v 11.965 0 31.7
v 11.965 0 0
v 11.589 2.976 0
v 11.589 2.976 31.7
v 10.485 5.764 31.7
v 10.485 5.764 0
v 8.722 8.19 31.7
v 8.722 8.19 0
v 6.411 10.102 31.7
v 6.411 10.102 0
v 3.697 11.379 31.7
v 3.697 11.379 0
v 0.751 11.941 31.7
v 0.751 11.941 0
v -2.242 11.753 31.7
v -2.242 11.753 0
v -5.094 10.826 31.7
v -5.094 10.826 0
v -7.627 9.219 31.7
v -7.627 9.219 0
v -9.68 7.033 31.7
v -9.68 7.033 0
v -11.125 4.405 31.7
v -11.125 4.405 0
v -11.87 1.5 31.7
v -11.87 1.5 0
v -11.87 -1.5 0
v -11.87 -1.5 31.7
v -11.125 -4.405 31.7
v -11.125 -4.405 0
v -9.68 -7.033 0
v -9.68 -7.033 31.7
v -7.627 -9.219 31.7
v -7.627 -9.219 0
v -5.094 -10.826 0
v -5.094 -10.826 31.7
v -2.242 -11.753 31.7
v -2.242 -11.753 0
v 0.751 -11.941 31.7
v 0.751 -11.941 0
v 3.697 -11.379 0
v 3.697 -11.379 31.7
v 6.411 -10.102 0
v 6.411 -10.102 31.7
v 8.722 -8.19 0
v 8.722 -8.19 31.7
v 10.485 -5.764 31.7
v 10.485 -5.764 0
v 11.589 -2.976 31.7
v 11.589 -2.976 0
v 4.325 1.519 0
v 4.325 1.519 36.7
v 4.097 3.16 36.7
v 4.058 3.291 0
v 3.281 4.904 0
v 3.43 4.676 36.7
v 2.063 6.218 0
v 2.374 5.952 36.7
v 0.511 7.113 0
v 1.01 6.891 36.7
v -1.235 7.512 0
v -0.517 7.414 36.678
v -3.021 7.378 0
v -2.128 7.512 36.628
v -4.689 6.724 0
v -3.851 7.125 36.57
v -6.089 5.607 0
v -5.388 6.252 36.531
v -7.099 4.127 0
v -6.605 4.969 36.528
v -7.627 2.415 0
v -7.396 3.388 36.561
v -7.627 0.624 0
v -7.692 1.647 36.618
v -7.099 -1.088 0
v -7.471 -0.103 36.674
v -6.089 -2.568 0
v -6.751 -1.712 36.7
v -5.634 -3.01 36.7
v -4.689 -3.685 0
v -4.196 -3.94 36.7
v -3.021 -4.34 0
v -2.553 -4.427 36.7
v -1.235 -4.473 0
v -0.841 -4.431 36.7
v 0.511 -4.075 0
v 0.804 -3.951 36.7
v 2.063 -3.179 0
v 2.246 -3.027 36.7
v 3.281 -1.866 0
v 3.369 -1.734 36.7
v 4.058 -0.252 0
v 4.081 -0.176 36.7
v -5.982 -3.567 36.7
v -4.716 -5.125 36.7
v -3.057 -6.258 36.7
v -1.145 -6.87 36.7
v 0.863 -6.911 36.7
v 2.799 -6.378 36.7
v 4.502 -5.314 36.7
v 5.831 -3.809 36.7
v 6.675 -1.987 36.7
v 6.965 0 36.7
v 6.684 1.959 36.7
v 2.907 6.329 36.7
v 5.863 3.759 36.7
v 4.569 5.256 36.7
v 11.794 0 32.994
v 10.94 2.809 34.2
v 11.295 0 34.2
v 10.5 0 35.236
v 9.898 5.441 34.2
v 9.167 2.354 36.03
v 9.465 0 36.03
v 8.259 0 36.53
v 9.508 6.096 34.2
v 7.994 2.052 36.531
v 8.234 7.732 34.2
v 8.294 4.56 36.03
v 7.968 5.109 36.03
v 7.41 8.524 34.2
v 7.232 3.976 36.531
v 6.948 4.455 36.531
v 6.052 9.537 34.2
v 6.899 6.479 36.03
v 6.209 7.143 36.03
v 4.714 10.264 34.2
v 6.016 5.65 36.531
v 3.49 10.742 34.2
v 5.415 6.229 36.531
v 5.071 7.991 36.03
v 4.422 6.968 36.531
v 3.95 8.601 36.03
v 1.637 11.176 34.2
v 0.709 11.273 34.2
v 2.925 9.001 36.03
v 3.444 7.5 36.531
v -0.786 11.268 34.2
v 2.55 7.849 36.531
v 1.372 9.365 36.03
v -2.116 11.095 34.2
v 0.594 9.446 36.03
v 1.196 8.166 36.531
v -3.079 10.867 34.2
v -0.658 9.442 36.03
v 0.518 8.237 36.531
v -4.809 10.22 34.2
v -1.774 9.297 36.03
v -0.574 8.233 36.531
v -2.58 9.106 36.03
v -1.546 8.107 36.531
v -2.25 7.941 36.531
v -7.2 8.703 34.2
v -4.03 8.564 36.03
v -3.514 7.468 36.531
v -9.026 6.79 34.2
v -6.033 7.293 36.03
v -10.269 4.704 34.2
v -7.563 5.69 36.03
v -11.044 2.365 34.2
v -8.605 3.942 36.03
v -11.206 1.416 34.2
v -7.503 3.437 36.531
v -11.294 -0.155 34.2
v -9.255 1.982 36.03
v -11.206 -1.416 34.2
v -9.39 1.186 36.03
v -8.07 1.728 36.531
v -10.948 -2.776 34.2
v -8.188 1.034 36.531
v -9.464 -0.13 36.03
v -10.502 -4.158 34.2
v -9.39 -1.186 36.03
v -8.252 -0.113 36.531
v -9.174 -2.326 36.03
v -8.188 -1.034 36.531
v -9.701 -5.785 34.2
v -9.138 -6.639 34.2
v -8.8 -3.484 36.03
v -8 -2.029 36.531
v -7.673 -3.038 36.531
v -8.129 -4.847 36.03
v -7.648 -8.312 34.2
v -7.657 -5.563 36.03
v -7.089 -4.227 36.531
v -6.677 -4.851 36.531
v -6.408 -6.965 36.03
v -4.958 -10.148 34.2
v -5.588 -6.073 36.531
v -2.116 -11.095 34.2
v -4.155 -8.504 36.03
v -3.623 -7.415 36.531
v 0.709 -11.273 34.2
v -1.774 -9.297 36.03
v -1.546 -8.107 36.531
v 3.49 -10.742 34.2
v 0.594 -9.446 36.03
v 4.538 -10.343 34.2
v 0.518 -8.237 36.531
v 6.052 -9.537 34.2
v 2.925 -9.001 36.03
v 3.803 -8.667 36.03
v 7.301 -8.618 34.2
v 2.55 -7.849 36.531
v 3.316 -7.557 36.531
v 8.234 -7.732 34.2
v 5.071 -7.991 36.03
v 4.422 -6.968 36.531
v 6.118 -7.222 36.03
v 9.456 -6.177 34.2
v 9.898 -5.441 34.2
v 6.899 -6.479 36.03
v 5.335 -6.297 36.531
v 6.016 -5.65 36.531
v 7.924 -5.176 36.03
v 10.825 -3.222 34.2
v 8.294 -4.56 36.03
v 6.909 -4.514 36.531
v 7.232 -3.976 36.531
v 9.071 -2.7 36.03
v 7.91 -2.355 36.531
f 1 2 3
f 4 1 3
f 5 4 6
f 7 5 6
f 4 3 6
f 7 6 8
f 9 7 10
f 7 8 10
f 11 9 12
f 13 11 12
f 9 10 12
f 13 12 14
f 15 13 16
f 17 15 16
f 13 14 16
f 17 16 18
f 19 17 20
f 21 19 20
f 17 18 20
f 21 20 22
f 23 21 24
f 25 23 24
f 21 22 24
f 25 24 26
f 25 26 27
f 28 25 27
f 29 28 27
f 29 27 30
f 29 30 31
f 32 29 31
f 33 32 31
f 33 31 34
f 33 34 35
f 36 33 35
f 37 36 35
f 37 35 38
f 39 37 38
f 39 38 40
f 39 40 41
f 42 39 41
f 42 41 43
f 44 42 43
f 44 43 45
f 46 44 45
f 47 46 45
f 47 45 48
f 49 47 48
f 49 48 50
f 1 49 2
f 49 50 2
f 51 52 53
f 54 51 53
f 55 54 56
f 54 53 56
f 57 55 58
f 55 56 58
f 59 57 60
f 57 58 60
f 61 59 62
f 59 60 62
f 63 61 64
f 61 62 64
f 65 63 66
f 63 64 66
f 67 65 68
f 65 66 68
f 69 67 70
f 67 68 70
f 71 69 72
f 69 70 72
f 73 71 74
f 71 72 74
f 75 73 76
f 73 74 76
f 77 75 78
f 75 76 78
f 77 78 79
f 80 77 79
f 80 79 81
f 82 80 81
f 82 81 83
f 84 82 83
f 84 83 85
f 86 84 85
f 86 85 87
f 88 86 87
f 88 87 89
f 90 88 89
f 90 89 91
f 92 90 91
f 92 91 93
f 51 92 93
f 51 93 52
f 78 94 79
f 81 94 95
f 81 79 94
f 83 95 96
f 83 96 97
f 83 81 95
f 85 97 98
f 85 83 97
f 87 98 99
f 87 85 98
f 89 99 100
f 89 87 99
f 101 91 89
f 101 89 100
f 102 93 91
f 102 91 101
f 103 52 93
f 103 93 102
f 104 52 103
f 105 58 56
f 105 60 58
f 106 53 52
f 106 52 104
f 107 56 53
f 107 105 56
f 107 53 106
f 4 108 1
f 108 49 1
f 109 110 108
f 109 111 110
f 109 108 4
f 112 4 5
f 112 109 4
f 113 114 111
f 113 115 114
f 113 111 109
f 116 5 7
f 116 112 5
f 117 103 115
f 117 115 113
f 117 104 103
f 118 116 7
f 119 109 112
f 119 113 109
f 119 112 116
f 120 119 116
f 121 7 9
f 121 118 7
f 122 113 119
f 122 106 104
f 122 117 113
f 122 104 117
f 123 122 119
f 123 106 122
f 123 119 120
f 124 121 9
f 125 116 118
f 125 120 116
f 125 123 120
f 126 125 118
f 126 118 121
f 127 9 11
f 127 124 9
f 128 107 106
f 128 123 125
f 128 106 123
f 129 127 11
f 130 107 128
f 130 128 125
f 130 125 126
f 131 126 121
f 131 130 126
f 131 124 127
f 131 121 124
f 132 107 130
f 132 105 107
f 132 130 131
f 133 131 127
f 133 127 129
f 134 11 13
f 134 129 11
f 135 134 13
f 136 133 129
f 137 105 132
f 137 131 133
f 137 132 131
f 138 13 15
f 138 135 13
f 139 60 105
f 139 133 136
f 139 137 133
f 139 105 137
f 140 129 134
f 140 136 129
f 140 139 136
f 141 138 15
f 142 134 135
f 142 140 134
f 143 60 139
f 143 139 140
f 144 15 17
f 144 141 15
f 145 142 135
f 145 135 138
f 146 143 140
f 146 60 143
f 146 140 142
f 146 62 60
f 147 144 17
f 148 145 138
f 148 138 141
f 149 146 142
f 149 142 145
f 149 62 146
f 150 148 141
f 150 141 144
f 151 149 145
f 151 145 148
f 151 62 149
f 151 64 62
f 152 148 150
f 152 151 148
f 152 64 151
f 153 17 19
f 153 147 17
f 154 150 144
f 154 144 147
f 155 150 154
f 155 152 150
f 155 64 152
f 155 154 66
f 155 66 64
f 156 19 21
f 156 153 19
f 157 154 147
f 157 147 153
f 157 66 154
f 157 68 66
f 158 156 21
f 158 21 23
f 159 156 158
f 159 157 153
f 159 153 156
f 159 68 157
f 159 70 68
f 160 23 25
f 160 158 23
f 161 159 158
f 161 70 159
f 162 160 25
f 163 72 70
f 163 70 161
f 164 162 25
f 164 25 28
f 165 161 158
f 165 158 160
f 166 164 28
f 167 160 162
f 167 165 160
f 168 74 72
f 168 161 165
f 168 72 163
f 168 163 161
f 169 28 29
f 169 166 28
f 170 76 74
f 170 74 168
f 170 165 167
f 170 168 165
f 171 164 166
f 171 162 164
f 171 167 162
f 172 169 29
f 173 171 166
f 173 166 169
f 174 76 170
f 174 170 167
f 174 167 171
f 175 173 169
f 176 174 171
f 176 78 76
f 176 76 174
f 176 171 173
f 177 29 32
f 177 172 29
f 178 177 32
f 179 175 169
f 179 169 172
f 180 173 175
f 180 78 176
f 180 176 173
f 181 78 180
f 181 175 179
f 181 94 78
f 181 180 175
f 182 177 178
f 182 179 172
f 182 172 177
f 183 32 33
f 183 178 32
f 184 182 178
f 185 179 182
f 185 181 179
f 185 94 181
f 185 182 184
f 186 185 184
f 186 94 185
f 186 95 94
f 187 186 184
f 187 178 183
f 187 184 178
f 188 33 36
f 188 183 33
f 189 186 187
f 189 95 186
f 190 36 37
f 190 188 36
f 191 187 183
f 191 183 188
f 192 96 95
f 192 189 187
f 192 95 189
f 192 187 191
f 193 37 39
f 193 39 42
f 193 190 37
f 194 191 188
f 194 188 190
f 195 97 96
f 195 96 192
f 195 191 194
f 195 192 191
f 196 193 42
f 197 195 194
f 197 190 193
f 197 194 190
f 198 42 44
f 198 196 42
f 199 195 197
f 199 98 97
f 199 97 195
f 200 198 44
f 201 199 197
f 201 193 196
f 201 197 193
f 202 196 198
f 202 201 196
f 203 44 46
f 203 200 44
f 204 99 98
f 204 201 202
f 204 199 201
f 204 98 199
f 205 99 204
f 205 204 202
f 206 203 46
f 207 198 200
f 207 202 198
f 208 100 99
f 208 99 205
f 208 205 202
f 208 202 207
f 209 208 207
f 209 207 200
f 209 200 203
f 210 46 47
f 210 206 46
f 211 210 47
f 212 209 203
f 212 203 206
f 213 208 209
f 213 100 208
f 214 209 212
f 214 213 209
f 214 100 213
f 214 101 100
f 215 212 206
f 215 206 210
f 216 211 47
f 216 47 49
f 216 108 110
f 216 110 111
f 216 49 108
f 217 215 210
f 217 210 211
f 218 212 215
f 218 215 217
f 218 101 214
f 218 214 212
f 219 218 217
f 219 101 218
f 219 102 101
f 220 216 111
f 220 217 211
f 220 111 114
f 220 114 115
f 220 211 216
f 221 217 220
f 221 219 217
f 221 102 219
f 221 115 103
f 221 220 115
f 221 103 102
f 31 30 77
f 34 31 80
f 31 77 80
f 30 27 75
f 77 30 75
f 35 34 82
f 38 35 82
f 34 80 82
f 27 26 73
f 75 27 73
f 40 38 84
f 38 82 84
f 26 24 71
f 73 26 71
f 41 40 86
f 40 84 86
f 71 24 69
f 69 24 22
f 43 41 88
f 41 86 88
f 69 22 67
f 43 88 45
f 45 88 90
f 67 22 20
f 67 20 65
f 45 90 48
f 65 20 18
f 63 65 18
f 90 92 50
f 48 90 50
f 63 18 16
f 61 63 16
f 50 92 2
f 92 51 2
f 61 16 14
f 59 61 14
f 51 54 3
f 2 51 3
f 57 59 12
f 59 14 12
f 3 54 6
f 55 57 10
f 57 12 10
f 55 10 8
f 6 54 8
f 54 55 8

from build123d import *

# Parameters (mm, degrees)
F0_R     = 11.9647327703
F1_DEPTH = 36.7
F2_R     = 6.0094743431
F3_DEPTH = 36.701


# Not quite as in the source:
# - a fillet or chamfer that OpenCascade refuses, or shapes differently, is made with other operations: its cross-section is extruded or revolved along the edge and cut away or added


with BuildPart() as f1:
    # F0 (on Top) → F1 (new body)
    with BuildSketch(Plane.XY):
        Circle(F0_R)
    extrude(amount=F1_DEPTH)

    # F2 (on face) → F3 (cut, through all)
    with BuildSketch(Plane.XY.offset(36.7)):
        with Locations((-1.6841825563, 1.5192364808)):
            Circle(F2_R)
    extrude(amount=-F3_DEPTH, mode=Mode.SUBTRACT)

    # F4: fillet of radius 5 on 1 edges, made by hand

    # F4_s1 → F4_t2 (revolve, cut)
    with BuildSketch(Plane.XZ):
        with BuildLine():
            ThreePointArc((11.9647327703, 31.7), (10.5002666762, 35.2355339059), (6.9647327703, 36.7))
            Line((6.9647327703, 36.7), (11.9647327703, 36.7))
            Line((11.9647327703, 36.7), (11.9647327703, 31.7))
        make_face()
    revolve(axis=Axis((0, 0, 36.7), (0, 0, 1)), mode=Mode.SUBTRACT)


solid = f1.part
